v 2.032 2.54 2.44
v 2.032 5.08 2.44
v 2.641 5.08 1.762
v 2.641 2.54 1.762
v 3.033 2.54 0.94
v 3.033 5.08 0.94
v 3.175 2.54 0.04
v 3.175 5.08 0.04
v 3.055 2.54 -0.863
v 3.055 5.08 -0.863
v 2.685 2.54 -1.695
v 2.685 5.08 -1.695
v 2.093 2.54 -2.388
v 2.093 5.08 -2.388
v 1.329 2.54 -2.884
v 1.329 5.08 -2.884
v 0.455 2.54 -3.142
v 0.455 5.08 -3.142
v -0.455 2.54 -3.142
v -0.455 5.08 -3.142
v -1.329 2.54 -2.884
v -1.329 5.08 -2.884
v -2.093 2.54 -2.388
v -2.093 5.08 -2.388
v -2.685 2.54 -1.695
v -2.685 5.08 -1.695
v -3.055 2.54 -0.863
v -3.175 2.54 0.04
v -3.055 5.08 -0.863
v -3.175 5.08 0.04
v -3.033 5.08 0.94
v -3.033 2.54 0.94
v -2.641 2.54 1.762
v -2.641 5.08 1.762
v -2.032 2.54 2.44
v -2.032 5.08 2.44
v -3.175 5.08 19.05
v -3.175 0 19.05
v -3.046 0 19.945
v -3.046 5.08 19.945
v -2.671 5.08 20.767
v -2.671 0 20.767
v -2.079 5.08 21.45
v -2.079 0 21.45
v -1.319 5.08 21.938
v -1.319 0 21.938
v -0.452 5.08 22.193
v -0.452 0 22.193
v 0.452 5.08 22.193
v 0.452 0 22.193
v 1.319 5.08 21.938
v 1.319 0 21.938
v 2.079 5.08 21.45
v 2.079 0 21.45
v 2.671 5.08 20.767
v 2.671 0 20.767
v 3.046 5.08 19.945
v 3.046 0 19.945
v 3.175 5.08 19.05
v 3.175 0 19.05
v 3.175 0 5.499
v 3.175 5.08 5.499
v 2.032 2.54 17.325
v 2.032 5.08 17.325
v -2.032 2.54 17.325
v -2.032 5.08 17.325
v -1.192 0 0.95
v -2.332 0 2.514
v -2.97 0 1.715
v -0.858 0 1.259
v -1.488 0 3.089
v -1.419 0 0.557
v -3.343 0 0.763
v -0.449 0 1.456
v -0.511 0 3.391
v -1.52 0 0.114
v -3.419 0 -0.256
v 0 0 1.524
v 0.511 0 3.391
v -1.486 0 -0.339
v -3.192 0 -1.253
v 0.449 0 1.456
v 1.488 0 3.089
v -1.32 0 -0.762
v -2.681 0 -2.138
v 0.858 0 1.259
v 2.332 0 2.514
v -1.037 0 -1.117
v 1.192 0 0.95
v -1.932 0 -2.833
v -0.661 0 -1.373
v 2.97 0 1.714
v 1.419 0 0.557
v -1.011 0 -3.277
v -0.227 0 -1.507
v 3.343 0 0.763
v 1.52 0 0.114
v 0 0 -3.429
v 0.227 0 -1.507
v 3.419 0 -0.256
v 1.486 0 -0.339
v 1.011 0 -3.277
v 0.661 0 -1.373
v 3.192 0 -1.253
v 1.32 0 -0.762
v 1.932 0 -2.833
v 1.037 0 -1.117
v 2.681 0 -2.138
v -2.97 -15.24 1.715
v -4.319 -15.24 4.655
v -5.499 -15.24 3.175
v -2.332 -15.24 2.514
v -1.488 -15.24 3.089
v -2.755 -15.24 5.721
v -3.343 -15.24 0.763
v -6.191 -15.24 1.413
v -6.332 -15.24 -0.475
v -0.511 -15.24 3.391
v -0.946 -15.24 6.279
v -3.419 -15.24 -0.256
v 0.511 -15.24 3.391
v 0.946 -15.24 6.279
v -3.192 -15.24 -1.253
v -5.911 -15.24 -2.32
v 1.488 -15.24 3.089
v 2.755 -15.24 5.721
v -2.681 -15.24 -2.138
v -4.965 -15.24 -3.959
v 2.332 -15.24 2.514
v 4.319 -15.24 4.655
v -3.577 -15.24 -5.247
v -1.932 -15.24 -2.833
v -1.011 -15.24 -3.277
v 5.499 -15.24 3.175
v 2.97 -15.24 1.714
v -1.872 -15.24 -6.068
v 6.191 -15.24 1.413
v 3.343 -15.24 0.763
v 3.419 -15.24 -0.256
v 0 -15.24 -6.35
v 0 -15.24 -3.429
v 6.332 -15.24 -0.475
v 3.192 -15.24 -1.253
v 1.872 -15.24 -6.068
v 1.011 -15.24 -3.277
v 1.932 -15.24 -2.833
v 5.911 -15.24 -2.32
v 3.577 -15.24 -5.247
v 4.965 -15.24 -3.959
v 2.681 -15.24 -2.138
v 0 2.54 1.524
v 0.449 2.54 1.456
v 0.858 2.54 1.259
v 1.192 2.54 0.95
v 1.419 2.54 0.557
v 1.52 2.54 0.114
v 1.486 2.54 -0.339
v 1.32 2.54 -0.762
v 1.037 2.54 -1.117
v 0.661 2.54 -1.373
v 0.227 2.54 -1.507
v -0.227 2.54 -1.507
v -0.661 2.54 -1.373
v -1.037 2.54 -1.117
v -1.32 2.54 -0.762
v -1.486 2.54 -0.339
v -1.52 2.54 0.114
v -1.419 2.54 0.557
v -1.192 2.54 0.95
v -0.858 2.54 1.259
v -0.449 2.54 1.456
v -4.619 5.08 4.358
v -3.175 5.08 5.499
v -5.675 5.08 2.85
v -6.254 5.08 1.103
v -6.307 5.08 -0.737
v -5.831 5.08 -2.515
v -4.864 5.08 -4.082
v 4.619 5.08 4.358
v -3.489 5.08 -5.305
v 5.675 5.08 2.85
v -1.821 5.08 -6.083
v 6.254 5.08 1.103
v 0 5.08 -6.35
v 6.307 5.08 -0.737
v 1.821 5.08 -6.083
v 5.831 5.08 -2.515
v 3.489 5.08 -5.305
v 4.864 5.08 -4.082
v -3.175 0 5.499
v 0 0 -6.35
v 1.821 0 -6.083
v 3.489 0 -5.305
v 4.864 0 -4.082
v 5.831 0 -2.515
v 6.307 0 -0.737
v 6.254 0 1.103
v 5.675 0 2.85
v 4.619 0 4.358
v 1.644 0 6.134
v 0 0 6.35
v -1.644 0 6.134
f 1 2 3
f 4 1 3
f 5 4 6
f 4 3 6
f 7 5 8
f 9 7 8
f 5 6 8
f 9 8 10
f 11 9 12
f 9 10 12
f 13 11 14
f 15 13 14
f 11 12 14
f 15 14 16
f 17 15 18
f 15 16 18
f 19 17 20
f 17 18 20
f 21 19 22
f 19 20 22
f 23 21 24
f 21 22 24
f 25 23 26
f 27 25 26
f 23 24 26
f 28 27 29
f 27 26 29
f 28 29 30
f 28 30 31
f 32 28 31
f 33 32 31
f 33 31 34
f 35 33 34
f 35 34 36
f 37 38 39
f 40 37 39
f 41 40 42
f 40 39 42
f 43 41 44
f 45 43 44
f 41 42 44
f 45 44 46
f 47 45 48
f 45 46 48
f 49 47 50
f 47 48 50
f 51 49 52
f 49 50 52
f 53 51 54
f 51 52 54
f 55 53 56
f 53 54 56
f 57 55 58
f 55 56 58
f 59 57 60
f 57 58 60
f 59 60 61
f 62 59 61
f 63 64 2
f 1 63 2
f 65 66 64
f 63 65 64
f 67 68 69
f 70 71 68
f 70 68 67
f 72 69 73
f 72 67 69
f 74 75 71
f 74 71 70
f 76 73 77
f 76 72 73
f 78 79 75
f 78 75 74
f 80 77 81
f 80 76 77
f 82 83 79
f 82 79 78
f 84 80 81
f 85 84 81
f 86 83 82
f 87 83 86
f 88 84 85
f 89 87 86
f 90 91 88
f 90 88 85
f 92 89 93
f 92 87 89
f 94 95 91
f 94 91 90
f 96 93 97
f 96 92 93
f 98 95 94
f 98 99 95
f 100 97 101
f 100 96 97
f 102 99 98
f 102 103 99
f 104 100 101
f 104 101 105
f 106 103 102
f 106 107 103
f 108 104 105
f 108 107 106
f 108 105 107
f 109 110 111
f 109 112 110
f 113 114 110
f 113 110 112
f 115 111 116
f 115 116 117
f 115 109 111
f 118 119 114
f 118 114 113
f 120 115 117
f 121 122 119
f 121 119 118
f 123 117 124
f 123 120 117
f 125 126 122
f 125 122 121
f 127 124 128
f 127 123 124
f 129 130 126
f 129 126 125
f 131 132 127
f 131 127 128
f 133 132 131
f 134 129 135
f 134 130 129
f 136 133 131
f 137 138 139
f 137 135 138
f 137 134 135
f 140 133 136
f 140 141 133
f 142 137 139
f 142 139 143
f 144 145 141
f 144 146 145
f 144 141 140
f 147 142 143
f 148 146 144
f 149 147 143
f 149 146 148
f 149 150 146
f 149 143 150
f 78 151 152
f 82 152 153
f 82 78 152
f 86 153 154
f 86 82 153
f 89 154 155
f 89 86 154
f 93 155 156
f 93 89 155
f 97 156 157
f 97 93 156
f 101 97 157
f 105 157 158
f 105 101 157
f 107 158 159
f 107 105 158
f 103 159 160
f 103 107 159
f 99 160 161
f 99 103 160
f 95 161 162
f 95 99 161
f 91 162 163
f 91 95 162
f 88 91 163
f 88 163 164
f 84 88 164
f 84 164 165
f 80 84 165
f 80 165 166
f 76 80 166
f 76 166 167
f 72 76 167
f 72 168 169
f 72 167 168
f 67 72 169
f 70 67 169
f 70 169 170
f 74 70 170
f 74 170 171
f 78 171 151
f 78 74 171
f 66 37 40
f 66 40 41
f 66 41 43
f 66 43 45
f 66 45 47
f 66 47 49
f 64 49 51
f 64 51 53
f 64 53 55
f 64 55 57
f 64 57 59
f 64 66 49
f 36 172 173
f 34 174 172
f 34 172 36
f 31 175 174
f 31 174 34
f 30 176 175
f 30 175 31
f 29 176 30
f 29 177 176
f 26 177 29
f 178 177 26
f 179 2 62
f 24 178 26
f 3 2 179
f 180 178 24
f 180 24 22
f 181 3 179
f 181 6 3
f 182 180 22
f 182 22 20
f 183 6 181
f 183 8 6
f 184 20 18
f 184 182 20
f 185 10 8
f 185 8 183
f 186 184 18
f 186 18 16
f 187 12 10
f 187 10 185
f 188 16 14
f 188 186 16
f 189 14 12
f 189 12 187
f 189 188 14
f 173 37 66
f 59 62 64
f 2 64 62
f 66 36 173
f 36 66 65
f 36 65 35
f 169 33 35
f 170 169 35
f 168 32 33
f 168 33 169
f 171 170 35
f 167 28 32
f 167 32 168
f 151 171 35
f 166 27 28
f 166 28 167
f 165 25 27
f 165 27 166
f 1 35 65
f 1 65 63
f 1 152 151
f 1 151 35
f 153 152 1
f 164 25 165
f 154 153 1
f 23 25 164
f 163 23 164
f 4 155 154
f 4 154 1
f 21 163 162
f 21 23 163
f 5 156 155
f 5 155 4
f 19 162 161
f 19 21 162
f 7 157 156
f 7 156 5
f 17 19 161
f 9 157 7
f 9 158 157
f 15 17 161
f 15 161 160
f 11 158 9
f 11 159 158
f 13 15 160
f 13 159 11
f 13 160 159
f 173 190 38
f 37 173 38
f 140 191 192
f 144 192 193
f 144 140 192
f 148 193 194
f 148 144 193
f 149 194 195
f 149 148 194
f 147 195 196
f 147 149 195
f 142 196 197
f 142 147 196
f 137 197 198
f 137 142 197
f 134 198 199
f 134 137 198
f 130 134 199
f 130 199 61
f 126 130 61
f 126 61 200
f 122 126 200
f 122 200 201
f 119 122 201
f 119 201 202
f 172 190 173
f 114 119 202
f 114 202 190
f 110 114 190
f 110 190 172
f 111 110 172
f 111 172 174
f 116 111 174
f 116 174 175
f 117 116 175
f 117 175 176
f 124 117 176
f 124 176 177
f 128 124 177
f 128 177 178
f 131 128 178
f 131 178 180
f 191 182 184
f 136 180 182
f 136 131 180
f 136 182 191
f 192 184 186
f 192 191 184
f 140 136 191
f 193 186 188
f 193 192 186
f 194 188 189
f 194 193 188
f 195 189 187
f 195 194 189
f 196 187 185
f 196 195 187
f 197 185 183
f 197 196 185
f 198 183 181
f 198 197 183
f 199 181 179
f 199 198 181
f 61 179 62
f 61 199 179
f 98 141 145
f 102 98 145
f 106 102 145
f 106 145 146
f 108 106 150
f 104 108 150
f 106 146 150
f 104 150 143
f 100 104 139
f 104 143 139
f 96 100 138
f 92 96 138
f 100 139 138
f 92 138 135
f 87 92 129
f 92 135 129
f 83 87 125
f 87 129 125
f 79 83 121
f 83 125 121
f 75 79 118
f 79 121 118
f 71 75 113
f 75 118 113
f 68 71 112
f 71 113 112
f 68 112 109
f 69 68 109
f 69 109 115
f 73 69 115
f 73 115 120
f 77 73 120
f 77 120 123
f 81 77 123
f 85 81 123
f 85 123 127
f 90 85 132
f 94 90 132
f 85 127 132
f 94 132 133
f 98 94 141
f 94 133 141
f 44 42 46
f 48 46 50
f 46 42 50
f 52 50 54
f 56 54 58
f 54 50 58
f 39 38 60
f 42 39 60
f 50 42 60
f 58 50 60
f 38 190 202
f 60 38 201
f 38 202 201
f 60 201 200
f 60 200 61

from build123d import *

# Parameters (mm, degrees)
SKETCH1_R           = 1.524
BOSS_EXTRUDE1_DEPTH = 5.08
SKETCH2_R           = 3.175
SKETCH2_W           = 4.064
SKETCH2_H           = 17.78
CUT_EXTRUDE1_DEPTH  = 2.54
BOSS_EXTRUDE2_START = 15.24
SKETCH3_R           = 6.35
BOSS_EXTRUDE2_DEPTH = 15.24
SKETCH4_R           = 3.429
CUT_EXTRUDE2_DEPTH  = 15.24


with BuildPart() as part:
    # Sketch1 → Boss-Extrude1 (new body)
    with BuildSketch(Plane(origin=(0, 0, 0), x_dir=(1, 0, 0), z_dir=(0, 1, 0))):
        with BuildLine():
            ThreePointArc((3.175, -5.499261314), (0, 6.35), (-3.175, -5.499261314))
            Line((-3.175, -5.499261314), (-3.175, -19.05))
            ThreePointArc((-3.175, -19.05), (0, -22.225), (3.175, -19.05))
            Line((3.175, -19.05), (3.175, -5.499261314))
        make_face()
        with Locations(Location((0, 0, 0), (0, 0, 270))):
            Circle(SKETCH1_R, mode=Mode.SUBTRACT)
    extrude(amount=BOSS_EXTRUDE1_DEPTH)

    # Sketch2 → Cut-Extrude1 (cut)
    with BuildSketch(Plane(origin=(0, 5.08, 0), x_dir=(1, 0, 0), z_dir=(0, 1, 0))):
        Circle(SKETCH2_R)
        with Locations((0, -8.434547342)):
            Rectangle(SKETCH2_W, SKETCH2_H)
    extrude(amount=-CUT_EXTRUDE1_DEPTH, mode=Mode.SUBTRACT)

    # Sketch3 → Boss-Extrude2 (add)
    with BuildSketch(Plane.XZ.offset(BOSS_EXTRUDE2_START)):
        with Locations(Location((0, 0, 0), (0, 0, 270))):
            Circle(SKETCH3_R)
    extrude(amount=-BOSS_EXTRUDE2_DEPTH)

    # Sketch4 → Cut-Extrude2 (cut)
    with BuildSketch(Plane.XZ.offset(15.24)):
        with Locations(Location((0, 0, 0), (0, 0, 270))):
            Circle(SKETCH4_R)
    extrude(amount=-CUT_EXTRUDE2_DEPTH, mode=Mode.SUBTRACT)


solid = part.part
